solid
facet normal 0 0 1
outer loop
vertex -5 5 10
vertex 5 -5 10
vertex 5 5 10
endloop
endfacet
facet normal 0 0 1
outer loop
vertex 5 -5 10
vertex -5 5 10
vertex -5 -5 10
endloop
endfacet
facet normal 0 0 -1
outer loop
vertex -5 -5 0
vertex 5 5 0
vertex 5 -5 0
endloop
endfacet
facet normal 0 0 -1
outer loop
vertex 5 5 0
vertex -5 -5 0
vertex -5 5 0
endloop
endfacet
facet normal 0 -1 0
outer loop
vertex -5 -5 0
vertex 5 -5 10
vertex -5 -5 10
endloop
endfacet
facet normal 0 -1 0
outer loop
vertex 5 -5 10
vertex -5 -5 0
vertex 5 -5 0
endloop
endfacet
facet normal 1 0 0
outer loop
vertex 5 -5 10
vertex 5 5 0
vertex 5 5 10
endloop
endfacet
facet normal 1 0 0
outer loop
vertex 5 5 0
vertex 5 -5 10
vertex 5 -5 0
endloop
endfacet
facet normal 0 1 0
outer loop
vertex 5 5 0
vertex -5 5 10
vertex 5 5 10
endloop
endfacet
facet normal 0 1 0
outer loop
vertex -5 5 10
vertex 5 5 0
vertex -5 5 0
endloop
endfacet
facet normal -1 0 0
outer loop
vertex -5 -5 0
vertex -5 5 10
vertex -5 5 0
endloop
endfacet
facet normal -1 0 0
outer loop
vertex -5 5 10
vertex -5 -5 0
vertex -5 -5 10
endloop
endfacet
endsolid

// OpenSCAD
//What size do you want?
/* [Cube] */

cube_size_small = 10; // [1:100]

mycubeSmall(cube_size_small);
            
module mycubeSmall(cube_size) {
	translate([0, 0, cube_size/2]) cube(cube_size, center=true);
}
